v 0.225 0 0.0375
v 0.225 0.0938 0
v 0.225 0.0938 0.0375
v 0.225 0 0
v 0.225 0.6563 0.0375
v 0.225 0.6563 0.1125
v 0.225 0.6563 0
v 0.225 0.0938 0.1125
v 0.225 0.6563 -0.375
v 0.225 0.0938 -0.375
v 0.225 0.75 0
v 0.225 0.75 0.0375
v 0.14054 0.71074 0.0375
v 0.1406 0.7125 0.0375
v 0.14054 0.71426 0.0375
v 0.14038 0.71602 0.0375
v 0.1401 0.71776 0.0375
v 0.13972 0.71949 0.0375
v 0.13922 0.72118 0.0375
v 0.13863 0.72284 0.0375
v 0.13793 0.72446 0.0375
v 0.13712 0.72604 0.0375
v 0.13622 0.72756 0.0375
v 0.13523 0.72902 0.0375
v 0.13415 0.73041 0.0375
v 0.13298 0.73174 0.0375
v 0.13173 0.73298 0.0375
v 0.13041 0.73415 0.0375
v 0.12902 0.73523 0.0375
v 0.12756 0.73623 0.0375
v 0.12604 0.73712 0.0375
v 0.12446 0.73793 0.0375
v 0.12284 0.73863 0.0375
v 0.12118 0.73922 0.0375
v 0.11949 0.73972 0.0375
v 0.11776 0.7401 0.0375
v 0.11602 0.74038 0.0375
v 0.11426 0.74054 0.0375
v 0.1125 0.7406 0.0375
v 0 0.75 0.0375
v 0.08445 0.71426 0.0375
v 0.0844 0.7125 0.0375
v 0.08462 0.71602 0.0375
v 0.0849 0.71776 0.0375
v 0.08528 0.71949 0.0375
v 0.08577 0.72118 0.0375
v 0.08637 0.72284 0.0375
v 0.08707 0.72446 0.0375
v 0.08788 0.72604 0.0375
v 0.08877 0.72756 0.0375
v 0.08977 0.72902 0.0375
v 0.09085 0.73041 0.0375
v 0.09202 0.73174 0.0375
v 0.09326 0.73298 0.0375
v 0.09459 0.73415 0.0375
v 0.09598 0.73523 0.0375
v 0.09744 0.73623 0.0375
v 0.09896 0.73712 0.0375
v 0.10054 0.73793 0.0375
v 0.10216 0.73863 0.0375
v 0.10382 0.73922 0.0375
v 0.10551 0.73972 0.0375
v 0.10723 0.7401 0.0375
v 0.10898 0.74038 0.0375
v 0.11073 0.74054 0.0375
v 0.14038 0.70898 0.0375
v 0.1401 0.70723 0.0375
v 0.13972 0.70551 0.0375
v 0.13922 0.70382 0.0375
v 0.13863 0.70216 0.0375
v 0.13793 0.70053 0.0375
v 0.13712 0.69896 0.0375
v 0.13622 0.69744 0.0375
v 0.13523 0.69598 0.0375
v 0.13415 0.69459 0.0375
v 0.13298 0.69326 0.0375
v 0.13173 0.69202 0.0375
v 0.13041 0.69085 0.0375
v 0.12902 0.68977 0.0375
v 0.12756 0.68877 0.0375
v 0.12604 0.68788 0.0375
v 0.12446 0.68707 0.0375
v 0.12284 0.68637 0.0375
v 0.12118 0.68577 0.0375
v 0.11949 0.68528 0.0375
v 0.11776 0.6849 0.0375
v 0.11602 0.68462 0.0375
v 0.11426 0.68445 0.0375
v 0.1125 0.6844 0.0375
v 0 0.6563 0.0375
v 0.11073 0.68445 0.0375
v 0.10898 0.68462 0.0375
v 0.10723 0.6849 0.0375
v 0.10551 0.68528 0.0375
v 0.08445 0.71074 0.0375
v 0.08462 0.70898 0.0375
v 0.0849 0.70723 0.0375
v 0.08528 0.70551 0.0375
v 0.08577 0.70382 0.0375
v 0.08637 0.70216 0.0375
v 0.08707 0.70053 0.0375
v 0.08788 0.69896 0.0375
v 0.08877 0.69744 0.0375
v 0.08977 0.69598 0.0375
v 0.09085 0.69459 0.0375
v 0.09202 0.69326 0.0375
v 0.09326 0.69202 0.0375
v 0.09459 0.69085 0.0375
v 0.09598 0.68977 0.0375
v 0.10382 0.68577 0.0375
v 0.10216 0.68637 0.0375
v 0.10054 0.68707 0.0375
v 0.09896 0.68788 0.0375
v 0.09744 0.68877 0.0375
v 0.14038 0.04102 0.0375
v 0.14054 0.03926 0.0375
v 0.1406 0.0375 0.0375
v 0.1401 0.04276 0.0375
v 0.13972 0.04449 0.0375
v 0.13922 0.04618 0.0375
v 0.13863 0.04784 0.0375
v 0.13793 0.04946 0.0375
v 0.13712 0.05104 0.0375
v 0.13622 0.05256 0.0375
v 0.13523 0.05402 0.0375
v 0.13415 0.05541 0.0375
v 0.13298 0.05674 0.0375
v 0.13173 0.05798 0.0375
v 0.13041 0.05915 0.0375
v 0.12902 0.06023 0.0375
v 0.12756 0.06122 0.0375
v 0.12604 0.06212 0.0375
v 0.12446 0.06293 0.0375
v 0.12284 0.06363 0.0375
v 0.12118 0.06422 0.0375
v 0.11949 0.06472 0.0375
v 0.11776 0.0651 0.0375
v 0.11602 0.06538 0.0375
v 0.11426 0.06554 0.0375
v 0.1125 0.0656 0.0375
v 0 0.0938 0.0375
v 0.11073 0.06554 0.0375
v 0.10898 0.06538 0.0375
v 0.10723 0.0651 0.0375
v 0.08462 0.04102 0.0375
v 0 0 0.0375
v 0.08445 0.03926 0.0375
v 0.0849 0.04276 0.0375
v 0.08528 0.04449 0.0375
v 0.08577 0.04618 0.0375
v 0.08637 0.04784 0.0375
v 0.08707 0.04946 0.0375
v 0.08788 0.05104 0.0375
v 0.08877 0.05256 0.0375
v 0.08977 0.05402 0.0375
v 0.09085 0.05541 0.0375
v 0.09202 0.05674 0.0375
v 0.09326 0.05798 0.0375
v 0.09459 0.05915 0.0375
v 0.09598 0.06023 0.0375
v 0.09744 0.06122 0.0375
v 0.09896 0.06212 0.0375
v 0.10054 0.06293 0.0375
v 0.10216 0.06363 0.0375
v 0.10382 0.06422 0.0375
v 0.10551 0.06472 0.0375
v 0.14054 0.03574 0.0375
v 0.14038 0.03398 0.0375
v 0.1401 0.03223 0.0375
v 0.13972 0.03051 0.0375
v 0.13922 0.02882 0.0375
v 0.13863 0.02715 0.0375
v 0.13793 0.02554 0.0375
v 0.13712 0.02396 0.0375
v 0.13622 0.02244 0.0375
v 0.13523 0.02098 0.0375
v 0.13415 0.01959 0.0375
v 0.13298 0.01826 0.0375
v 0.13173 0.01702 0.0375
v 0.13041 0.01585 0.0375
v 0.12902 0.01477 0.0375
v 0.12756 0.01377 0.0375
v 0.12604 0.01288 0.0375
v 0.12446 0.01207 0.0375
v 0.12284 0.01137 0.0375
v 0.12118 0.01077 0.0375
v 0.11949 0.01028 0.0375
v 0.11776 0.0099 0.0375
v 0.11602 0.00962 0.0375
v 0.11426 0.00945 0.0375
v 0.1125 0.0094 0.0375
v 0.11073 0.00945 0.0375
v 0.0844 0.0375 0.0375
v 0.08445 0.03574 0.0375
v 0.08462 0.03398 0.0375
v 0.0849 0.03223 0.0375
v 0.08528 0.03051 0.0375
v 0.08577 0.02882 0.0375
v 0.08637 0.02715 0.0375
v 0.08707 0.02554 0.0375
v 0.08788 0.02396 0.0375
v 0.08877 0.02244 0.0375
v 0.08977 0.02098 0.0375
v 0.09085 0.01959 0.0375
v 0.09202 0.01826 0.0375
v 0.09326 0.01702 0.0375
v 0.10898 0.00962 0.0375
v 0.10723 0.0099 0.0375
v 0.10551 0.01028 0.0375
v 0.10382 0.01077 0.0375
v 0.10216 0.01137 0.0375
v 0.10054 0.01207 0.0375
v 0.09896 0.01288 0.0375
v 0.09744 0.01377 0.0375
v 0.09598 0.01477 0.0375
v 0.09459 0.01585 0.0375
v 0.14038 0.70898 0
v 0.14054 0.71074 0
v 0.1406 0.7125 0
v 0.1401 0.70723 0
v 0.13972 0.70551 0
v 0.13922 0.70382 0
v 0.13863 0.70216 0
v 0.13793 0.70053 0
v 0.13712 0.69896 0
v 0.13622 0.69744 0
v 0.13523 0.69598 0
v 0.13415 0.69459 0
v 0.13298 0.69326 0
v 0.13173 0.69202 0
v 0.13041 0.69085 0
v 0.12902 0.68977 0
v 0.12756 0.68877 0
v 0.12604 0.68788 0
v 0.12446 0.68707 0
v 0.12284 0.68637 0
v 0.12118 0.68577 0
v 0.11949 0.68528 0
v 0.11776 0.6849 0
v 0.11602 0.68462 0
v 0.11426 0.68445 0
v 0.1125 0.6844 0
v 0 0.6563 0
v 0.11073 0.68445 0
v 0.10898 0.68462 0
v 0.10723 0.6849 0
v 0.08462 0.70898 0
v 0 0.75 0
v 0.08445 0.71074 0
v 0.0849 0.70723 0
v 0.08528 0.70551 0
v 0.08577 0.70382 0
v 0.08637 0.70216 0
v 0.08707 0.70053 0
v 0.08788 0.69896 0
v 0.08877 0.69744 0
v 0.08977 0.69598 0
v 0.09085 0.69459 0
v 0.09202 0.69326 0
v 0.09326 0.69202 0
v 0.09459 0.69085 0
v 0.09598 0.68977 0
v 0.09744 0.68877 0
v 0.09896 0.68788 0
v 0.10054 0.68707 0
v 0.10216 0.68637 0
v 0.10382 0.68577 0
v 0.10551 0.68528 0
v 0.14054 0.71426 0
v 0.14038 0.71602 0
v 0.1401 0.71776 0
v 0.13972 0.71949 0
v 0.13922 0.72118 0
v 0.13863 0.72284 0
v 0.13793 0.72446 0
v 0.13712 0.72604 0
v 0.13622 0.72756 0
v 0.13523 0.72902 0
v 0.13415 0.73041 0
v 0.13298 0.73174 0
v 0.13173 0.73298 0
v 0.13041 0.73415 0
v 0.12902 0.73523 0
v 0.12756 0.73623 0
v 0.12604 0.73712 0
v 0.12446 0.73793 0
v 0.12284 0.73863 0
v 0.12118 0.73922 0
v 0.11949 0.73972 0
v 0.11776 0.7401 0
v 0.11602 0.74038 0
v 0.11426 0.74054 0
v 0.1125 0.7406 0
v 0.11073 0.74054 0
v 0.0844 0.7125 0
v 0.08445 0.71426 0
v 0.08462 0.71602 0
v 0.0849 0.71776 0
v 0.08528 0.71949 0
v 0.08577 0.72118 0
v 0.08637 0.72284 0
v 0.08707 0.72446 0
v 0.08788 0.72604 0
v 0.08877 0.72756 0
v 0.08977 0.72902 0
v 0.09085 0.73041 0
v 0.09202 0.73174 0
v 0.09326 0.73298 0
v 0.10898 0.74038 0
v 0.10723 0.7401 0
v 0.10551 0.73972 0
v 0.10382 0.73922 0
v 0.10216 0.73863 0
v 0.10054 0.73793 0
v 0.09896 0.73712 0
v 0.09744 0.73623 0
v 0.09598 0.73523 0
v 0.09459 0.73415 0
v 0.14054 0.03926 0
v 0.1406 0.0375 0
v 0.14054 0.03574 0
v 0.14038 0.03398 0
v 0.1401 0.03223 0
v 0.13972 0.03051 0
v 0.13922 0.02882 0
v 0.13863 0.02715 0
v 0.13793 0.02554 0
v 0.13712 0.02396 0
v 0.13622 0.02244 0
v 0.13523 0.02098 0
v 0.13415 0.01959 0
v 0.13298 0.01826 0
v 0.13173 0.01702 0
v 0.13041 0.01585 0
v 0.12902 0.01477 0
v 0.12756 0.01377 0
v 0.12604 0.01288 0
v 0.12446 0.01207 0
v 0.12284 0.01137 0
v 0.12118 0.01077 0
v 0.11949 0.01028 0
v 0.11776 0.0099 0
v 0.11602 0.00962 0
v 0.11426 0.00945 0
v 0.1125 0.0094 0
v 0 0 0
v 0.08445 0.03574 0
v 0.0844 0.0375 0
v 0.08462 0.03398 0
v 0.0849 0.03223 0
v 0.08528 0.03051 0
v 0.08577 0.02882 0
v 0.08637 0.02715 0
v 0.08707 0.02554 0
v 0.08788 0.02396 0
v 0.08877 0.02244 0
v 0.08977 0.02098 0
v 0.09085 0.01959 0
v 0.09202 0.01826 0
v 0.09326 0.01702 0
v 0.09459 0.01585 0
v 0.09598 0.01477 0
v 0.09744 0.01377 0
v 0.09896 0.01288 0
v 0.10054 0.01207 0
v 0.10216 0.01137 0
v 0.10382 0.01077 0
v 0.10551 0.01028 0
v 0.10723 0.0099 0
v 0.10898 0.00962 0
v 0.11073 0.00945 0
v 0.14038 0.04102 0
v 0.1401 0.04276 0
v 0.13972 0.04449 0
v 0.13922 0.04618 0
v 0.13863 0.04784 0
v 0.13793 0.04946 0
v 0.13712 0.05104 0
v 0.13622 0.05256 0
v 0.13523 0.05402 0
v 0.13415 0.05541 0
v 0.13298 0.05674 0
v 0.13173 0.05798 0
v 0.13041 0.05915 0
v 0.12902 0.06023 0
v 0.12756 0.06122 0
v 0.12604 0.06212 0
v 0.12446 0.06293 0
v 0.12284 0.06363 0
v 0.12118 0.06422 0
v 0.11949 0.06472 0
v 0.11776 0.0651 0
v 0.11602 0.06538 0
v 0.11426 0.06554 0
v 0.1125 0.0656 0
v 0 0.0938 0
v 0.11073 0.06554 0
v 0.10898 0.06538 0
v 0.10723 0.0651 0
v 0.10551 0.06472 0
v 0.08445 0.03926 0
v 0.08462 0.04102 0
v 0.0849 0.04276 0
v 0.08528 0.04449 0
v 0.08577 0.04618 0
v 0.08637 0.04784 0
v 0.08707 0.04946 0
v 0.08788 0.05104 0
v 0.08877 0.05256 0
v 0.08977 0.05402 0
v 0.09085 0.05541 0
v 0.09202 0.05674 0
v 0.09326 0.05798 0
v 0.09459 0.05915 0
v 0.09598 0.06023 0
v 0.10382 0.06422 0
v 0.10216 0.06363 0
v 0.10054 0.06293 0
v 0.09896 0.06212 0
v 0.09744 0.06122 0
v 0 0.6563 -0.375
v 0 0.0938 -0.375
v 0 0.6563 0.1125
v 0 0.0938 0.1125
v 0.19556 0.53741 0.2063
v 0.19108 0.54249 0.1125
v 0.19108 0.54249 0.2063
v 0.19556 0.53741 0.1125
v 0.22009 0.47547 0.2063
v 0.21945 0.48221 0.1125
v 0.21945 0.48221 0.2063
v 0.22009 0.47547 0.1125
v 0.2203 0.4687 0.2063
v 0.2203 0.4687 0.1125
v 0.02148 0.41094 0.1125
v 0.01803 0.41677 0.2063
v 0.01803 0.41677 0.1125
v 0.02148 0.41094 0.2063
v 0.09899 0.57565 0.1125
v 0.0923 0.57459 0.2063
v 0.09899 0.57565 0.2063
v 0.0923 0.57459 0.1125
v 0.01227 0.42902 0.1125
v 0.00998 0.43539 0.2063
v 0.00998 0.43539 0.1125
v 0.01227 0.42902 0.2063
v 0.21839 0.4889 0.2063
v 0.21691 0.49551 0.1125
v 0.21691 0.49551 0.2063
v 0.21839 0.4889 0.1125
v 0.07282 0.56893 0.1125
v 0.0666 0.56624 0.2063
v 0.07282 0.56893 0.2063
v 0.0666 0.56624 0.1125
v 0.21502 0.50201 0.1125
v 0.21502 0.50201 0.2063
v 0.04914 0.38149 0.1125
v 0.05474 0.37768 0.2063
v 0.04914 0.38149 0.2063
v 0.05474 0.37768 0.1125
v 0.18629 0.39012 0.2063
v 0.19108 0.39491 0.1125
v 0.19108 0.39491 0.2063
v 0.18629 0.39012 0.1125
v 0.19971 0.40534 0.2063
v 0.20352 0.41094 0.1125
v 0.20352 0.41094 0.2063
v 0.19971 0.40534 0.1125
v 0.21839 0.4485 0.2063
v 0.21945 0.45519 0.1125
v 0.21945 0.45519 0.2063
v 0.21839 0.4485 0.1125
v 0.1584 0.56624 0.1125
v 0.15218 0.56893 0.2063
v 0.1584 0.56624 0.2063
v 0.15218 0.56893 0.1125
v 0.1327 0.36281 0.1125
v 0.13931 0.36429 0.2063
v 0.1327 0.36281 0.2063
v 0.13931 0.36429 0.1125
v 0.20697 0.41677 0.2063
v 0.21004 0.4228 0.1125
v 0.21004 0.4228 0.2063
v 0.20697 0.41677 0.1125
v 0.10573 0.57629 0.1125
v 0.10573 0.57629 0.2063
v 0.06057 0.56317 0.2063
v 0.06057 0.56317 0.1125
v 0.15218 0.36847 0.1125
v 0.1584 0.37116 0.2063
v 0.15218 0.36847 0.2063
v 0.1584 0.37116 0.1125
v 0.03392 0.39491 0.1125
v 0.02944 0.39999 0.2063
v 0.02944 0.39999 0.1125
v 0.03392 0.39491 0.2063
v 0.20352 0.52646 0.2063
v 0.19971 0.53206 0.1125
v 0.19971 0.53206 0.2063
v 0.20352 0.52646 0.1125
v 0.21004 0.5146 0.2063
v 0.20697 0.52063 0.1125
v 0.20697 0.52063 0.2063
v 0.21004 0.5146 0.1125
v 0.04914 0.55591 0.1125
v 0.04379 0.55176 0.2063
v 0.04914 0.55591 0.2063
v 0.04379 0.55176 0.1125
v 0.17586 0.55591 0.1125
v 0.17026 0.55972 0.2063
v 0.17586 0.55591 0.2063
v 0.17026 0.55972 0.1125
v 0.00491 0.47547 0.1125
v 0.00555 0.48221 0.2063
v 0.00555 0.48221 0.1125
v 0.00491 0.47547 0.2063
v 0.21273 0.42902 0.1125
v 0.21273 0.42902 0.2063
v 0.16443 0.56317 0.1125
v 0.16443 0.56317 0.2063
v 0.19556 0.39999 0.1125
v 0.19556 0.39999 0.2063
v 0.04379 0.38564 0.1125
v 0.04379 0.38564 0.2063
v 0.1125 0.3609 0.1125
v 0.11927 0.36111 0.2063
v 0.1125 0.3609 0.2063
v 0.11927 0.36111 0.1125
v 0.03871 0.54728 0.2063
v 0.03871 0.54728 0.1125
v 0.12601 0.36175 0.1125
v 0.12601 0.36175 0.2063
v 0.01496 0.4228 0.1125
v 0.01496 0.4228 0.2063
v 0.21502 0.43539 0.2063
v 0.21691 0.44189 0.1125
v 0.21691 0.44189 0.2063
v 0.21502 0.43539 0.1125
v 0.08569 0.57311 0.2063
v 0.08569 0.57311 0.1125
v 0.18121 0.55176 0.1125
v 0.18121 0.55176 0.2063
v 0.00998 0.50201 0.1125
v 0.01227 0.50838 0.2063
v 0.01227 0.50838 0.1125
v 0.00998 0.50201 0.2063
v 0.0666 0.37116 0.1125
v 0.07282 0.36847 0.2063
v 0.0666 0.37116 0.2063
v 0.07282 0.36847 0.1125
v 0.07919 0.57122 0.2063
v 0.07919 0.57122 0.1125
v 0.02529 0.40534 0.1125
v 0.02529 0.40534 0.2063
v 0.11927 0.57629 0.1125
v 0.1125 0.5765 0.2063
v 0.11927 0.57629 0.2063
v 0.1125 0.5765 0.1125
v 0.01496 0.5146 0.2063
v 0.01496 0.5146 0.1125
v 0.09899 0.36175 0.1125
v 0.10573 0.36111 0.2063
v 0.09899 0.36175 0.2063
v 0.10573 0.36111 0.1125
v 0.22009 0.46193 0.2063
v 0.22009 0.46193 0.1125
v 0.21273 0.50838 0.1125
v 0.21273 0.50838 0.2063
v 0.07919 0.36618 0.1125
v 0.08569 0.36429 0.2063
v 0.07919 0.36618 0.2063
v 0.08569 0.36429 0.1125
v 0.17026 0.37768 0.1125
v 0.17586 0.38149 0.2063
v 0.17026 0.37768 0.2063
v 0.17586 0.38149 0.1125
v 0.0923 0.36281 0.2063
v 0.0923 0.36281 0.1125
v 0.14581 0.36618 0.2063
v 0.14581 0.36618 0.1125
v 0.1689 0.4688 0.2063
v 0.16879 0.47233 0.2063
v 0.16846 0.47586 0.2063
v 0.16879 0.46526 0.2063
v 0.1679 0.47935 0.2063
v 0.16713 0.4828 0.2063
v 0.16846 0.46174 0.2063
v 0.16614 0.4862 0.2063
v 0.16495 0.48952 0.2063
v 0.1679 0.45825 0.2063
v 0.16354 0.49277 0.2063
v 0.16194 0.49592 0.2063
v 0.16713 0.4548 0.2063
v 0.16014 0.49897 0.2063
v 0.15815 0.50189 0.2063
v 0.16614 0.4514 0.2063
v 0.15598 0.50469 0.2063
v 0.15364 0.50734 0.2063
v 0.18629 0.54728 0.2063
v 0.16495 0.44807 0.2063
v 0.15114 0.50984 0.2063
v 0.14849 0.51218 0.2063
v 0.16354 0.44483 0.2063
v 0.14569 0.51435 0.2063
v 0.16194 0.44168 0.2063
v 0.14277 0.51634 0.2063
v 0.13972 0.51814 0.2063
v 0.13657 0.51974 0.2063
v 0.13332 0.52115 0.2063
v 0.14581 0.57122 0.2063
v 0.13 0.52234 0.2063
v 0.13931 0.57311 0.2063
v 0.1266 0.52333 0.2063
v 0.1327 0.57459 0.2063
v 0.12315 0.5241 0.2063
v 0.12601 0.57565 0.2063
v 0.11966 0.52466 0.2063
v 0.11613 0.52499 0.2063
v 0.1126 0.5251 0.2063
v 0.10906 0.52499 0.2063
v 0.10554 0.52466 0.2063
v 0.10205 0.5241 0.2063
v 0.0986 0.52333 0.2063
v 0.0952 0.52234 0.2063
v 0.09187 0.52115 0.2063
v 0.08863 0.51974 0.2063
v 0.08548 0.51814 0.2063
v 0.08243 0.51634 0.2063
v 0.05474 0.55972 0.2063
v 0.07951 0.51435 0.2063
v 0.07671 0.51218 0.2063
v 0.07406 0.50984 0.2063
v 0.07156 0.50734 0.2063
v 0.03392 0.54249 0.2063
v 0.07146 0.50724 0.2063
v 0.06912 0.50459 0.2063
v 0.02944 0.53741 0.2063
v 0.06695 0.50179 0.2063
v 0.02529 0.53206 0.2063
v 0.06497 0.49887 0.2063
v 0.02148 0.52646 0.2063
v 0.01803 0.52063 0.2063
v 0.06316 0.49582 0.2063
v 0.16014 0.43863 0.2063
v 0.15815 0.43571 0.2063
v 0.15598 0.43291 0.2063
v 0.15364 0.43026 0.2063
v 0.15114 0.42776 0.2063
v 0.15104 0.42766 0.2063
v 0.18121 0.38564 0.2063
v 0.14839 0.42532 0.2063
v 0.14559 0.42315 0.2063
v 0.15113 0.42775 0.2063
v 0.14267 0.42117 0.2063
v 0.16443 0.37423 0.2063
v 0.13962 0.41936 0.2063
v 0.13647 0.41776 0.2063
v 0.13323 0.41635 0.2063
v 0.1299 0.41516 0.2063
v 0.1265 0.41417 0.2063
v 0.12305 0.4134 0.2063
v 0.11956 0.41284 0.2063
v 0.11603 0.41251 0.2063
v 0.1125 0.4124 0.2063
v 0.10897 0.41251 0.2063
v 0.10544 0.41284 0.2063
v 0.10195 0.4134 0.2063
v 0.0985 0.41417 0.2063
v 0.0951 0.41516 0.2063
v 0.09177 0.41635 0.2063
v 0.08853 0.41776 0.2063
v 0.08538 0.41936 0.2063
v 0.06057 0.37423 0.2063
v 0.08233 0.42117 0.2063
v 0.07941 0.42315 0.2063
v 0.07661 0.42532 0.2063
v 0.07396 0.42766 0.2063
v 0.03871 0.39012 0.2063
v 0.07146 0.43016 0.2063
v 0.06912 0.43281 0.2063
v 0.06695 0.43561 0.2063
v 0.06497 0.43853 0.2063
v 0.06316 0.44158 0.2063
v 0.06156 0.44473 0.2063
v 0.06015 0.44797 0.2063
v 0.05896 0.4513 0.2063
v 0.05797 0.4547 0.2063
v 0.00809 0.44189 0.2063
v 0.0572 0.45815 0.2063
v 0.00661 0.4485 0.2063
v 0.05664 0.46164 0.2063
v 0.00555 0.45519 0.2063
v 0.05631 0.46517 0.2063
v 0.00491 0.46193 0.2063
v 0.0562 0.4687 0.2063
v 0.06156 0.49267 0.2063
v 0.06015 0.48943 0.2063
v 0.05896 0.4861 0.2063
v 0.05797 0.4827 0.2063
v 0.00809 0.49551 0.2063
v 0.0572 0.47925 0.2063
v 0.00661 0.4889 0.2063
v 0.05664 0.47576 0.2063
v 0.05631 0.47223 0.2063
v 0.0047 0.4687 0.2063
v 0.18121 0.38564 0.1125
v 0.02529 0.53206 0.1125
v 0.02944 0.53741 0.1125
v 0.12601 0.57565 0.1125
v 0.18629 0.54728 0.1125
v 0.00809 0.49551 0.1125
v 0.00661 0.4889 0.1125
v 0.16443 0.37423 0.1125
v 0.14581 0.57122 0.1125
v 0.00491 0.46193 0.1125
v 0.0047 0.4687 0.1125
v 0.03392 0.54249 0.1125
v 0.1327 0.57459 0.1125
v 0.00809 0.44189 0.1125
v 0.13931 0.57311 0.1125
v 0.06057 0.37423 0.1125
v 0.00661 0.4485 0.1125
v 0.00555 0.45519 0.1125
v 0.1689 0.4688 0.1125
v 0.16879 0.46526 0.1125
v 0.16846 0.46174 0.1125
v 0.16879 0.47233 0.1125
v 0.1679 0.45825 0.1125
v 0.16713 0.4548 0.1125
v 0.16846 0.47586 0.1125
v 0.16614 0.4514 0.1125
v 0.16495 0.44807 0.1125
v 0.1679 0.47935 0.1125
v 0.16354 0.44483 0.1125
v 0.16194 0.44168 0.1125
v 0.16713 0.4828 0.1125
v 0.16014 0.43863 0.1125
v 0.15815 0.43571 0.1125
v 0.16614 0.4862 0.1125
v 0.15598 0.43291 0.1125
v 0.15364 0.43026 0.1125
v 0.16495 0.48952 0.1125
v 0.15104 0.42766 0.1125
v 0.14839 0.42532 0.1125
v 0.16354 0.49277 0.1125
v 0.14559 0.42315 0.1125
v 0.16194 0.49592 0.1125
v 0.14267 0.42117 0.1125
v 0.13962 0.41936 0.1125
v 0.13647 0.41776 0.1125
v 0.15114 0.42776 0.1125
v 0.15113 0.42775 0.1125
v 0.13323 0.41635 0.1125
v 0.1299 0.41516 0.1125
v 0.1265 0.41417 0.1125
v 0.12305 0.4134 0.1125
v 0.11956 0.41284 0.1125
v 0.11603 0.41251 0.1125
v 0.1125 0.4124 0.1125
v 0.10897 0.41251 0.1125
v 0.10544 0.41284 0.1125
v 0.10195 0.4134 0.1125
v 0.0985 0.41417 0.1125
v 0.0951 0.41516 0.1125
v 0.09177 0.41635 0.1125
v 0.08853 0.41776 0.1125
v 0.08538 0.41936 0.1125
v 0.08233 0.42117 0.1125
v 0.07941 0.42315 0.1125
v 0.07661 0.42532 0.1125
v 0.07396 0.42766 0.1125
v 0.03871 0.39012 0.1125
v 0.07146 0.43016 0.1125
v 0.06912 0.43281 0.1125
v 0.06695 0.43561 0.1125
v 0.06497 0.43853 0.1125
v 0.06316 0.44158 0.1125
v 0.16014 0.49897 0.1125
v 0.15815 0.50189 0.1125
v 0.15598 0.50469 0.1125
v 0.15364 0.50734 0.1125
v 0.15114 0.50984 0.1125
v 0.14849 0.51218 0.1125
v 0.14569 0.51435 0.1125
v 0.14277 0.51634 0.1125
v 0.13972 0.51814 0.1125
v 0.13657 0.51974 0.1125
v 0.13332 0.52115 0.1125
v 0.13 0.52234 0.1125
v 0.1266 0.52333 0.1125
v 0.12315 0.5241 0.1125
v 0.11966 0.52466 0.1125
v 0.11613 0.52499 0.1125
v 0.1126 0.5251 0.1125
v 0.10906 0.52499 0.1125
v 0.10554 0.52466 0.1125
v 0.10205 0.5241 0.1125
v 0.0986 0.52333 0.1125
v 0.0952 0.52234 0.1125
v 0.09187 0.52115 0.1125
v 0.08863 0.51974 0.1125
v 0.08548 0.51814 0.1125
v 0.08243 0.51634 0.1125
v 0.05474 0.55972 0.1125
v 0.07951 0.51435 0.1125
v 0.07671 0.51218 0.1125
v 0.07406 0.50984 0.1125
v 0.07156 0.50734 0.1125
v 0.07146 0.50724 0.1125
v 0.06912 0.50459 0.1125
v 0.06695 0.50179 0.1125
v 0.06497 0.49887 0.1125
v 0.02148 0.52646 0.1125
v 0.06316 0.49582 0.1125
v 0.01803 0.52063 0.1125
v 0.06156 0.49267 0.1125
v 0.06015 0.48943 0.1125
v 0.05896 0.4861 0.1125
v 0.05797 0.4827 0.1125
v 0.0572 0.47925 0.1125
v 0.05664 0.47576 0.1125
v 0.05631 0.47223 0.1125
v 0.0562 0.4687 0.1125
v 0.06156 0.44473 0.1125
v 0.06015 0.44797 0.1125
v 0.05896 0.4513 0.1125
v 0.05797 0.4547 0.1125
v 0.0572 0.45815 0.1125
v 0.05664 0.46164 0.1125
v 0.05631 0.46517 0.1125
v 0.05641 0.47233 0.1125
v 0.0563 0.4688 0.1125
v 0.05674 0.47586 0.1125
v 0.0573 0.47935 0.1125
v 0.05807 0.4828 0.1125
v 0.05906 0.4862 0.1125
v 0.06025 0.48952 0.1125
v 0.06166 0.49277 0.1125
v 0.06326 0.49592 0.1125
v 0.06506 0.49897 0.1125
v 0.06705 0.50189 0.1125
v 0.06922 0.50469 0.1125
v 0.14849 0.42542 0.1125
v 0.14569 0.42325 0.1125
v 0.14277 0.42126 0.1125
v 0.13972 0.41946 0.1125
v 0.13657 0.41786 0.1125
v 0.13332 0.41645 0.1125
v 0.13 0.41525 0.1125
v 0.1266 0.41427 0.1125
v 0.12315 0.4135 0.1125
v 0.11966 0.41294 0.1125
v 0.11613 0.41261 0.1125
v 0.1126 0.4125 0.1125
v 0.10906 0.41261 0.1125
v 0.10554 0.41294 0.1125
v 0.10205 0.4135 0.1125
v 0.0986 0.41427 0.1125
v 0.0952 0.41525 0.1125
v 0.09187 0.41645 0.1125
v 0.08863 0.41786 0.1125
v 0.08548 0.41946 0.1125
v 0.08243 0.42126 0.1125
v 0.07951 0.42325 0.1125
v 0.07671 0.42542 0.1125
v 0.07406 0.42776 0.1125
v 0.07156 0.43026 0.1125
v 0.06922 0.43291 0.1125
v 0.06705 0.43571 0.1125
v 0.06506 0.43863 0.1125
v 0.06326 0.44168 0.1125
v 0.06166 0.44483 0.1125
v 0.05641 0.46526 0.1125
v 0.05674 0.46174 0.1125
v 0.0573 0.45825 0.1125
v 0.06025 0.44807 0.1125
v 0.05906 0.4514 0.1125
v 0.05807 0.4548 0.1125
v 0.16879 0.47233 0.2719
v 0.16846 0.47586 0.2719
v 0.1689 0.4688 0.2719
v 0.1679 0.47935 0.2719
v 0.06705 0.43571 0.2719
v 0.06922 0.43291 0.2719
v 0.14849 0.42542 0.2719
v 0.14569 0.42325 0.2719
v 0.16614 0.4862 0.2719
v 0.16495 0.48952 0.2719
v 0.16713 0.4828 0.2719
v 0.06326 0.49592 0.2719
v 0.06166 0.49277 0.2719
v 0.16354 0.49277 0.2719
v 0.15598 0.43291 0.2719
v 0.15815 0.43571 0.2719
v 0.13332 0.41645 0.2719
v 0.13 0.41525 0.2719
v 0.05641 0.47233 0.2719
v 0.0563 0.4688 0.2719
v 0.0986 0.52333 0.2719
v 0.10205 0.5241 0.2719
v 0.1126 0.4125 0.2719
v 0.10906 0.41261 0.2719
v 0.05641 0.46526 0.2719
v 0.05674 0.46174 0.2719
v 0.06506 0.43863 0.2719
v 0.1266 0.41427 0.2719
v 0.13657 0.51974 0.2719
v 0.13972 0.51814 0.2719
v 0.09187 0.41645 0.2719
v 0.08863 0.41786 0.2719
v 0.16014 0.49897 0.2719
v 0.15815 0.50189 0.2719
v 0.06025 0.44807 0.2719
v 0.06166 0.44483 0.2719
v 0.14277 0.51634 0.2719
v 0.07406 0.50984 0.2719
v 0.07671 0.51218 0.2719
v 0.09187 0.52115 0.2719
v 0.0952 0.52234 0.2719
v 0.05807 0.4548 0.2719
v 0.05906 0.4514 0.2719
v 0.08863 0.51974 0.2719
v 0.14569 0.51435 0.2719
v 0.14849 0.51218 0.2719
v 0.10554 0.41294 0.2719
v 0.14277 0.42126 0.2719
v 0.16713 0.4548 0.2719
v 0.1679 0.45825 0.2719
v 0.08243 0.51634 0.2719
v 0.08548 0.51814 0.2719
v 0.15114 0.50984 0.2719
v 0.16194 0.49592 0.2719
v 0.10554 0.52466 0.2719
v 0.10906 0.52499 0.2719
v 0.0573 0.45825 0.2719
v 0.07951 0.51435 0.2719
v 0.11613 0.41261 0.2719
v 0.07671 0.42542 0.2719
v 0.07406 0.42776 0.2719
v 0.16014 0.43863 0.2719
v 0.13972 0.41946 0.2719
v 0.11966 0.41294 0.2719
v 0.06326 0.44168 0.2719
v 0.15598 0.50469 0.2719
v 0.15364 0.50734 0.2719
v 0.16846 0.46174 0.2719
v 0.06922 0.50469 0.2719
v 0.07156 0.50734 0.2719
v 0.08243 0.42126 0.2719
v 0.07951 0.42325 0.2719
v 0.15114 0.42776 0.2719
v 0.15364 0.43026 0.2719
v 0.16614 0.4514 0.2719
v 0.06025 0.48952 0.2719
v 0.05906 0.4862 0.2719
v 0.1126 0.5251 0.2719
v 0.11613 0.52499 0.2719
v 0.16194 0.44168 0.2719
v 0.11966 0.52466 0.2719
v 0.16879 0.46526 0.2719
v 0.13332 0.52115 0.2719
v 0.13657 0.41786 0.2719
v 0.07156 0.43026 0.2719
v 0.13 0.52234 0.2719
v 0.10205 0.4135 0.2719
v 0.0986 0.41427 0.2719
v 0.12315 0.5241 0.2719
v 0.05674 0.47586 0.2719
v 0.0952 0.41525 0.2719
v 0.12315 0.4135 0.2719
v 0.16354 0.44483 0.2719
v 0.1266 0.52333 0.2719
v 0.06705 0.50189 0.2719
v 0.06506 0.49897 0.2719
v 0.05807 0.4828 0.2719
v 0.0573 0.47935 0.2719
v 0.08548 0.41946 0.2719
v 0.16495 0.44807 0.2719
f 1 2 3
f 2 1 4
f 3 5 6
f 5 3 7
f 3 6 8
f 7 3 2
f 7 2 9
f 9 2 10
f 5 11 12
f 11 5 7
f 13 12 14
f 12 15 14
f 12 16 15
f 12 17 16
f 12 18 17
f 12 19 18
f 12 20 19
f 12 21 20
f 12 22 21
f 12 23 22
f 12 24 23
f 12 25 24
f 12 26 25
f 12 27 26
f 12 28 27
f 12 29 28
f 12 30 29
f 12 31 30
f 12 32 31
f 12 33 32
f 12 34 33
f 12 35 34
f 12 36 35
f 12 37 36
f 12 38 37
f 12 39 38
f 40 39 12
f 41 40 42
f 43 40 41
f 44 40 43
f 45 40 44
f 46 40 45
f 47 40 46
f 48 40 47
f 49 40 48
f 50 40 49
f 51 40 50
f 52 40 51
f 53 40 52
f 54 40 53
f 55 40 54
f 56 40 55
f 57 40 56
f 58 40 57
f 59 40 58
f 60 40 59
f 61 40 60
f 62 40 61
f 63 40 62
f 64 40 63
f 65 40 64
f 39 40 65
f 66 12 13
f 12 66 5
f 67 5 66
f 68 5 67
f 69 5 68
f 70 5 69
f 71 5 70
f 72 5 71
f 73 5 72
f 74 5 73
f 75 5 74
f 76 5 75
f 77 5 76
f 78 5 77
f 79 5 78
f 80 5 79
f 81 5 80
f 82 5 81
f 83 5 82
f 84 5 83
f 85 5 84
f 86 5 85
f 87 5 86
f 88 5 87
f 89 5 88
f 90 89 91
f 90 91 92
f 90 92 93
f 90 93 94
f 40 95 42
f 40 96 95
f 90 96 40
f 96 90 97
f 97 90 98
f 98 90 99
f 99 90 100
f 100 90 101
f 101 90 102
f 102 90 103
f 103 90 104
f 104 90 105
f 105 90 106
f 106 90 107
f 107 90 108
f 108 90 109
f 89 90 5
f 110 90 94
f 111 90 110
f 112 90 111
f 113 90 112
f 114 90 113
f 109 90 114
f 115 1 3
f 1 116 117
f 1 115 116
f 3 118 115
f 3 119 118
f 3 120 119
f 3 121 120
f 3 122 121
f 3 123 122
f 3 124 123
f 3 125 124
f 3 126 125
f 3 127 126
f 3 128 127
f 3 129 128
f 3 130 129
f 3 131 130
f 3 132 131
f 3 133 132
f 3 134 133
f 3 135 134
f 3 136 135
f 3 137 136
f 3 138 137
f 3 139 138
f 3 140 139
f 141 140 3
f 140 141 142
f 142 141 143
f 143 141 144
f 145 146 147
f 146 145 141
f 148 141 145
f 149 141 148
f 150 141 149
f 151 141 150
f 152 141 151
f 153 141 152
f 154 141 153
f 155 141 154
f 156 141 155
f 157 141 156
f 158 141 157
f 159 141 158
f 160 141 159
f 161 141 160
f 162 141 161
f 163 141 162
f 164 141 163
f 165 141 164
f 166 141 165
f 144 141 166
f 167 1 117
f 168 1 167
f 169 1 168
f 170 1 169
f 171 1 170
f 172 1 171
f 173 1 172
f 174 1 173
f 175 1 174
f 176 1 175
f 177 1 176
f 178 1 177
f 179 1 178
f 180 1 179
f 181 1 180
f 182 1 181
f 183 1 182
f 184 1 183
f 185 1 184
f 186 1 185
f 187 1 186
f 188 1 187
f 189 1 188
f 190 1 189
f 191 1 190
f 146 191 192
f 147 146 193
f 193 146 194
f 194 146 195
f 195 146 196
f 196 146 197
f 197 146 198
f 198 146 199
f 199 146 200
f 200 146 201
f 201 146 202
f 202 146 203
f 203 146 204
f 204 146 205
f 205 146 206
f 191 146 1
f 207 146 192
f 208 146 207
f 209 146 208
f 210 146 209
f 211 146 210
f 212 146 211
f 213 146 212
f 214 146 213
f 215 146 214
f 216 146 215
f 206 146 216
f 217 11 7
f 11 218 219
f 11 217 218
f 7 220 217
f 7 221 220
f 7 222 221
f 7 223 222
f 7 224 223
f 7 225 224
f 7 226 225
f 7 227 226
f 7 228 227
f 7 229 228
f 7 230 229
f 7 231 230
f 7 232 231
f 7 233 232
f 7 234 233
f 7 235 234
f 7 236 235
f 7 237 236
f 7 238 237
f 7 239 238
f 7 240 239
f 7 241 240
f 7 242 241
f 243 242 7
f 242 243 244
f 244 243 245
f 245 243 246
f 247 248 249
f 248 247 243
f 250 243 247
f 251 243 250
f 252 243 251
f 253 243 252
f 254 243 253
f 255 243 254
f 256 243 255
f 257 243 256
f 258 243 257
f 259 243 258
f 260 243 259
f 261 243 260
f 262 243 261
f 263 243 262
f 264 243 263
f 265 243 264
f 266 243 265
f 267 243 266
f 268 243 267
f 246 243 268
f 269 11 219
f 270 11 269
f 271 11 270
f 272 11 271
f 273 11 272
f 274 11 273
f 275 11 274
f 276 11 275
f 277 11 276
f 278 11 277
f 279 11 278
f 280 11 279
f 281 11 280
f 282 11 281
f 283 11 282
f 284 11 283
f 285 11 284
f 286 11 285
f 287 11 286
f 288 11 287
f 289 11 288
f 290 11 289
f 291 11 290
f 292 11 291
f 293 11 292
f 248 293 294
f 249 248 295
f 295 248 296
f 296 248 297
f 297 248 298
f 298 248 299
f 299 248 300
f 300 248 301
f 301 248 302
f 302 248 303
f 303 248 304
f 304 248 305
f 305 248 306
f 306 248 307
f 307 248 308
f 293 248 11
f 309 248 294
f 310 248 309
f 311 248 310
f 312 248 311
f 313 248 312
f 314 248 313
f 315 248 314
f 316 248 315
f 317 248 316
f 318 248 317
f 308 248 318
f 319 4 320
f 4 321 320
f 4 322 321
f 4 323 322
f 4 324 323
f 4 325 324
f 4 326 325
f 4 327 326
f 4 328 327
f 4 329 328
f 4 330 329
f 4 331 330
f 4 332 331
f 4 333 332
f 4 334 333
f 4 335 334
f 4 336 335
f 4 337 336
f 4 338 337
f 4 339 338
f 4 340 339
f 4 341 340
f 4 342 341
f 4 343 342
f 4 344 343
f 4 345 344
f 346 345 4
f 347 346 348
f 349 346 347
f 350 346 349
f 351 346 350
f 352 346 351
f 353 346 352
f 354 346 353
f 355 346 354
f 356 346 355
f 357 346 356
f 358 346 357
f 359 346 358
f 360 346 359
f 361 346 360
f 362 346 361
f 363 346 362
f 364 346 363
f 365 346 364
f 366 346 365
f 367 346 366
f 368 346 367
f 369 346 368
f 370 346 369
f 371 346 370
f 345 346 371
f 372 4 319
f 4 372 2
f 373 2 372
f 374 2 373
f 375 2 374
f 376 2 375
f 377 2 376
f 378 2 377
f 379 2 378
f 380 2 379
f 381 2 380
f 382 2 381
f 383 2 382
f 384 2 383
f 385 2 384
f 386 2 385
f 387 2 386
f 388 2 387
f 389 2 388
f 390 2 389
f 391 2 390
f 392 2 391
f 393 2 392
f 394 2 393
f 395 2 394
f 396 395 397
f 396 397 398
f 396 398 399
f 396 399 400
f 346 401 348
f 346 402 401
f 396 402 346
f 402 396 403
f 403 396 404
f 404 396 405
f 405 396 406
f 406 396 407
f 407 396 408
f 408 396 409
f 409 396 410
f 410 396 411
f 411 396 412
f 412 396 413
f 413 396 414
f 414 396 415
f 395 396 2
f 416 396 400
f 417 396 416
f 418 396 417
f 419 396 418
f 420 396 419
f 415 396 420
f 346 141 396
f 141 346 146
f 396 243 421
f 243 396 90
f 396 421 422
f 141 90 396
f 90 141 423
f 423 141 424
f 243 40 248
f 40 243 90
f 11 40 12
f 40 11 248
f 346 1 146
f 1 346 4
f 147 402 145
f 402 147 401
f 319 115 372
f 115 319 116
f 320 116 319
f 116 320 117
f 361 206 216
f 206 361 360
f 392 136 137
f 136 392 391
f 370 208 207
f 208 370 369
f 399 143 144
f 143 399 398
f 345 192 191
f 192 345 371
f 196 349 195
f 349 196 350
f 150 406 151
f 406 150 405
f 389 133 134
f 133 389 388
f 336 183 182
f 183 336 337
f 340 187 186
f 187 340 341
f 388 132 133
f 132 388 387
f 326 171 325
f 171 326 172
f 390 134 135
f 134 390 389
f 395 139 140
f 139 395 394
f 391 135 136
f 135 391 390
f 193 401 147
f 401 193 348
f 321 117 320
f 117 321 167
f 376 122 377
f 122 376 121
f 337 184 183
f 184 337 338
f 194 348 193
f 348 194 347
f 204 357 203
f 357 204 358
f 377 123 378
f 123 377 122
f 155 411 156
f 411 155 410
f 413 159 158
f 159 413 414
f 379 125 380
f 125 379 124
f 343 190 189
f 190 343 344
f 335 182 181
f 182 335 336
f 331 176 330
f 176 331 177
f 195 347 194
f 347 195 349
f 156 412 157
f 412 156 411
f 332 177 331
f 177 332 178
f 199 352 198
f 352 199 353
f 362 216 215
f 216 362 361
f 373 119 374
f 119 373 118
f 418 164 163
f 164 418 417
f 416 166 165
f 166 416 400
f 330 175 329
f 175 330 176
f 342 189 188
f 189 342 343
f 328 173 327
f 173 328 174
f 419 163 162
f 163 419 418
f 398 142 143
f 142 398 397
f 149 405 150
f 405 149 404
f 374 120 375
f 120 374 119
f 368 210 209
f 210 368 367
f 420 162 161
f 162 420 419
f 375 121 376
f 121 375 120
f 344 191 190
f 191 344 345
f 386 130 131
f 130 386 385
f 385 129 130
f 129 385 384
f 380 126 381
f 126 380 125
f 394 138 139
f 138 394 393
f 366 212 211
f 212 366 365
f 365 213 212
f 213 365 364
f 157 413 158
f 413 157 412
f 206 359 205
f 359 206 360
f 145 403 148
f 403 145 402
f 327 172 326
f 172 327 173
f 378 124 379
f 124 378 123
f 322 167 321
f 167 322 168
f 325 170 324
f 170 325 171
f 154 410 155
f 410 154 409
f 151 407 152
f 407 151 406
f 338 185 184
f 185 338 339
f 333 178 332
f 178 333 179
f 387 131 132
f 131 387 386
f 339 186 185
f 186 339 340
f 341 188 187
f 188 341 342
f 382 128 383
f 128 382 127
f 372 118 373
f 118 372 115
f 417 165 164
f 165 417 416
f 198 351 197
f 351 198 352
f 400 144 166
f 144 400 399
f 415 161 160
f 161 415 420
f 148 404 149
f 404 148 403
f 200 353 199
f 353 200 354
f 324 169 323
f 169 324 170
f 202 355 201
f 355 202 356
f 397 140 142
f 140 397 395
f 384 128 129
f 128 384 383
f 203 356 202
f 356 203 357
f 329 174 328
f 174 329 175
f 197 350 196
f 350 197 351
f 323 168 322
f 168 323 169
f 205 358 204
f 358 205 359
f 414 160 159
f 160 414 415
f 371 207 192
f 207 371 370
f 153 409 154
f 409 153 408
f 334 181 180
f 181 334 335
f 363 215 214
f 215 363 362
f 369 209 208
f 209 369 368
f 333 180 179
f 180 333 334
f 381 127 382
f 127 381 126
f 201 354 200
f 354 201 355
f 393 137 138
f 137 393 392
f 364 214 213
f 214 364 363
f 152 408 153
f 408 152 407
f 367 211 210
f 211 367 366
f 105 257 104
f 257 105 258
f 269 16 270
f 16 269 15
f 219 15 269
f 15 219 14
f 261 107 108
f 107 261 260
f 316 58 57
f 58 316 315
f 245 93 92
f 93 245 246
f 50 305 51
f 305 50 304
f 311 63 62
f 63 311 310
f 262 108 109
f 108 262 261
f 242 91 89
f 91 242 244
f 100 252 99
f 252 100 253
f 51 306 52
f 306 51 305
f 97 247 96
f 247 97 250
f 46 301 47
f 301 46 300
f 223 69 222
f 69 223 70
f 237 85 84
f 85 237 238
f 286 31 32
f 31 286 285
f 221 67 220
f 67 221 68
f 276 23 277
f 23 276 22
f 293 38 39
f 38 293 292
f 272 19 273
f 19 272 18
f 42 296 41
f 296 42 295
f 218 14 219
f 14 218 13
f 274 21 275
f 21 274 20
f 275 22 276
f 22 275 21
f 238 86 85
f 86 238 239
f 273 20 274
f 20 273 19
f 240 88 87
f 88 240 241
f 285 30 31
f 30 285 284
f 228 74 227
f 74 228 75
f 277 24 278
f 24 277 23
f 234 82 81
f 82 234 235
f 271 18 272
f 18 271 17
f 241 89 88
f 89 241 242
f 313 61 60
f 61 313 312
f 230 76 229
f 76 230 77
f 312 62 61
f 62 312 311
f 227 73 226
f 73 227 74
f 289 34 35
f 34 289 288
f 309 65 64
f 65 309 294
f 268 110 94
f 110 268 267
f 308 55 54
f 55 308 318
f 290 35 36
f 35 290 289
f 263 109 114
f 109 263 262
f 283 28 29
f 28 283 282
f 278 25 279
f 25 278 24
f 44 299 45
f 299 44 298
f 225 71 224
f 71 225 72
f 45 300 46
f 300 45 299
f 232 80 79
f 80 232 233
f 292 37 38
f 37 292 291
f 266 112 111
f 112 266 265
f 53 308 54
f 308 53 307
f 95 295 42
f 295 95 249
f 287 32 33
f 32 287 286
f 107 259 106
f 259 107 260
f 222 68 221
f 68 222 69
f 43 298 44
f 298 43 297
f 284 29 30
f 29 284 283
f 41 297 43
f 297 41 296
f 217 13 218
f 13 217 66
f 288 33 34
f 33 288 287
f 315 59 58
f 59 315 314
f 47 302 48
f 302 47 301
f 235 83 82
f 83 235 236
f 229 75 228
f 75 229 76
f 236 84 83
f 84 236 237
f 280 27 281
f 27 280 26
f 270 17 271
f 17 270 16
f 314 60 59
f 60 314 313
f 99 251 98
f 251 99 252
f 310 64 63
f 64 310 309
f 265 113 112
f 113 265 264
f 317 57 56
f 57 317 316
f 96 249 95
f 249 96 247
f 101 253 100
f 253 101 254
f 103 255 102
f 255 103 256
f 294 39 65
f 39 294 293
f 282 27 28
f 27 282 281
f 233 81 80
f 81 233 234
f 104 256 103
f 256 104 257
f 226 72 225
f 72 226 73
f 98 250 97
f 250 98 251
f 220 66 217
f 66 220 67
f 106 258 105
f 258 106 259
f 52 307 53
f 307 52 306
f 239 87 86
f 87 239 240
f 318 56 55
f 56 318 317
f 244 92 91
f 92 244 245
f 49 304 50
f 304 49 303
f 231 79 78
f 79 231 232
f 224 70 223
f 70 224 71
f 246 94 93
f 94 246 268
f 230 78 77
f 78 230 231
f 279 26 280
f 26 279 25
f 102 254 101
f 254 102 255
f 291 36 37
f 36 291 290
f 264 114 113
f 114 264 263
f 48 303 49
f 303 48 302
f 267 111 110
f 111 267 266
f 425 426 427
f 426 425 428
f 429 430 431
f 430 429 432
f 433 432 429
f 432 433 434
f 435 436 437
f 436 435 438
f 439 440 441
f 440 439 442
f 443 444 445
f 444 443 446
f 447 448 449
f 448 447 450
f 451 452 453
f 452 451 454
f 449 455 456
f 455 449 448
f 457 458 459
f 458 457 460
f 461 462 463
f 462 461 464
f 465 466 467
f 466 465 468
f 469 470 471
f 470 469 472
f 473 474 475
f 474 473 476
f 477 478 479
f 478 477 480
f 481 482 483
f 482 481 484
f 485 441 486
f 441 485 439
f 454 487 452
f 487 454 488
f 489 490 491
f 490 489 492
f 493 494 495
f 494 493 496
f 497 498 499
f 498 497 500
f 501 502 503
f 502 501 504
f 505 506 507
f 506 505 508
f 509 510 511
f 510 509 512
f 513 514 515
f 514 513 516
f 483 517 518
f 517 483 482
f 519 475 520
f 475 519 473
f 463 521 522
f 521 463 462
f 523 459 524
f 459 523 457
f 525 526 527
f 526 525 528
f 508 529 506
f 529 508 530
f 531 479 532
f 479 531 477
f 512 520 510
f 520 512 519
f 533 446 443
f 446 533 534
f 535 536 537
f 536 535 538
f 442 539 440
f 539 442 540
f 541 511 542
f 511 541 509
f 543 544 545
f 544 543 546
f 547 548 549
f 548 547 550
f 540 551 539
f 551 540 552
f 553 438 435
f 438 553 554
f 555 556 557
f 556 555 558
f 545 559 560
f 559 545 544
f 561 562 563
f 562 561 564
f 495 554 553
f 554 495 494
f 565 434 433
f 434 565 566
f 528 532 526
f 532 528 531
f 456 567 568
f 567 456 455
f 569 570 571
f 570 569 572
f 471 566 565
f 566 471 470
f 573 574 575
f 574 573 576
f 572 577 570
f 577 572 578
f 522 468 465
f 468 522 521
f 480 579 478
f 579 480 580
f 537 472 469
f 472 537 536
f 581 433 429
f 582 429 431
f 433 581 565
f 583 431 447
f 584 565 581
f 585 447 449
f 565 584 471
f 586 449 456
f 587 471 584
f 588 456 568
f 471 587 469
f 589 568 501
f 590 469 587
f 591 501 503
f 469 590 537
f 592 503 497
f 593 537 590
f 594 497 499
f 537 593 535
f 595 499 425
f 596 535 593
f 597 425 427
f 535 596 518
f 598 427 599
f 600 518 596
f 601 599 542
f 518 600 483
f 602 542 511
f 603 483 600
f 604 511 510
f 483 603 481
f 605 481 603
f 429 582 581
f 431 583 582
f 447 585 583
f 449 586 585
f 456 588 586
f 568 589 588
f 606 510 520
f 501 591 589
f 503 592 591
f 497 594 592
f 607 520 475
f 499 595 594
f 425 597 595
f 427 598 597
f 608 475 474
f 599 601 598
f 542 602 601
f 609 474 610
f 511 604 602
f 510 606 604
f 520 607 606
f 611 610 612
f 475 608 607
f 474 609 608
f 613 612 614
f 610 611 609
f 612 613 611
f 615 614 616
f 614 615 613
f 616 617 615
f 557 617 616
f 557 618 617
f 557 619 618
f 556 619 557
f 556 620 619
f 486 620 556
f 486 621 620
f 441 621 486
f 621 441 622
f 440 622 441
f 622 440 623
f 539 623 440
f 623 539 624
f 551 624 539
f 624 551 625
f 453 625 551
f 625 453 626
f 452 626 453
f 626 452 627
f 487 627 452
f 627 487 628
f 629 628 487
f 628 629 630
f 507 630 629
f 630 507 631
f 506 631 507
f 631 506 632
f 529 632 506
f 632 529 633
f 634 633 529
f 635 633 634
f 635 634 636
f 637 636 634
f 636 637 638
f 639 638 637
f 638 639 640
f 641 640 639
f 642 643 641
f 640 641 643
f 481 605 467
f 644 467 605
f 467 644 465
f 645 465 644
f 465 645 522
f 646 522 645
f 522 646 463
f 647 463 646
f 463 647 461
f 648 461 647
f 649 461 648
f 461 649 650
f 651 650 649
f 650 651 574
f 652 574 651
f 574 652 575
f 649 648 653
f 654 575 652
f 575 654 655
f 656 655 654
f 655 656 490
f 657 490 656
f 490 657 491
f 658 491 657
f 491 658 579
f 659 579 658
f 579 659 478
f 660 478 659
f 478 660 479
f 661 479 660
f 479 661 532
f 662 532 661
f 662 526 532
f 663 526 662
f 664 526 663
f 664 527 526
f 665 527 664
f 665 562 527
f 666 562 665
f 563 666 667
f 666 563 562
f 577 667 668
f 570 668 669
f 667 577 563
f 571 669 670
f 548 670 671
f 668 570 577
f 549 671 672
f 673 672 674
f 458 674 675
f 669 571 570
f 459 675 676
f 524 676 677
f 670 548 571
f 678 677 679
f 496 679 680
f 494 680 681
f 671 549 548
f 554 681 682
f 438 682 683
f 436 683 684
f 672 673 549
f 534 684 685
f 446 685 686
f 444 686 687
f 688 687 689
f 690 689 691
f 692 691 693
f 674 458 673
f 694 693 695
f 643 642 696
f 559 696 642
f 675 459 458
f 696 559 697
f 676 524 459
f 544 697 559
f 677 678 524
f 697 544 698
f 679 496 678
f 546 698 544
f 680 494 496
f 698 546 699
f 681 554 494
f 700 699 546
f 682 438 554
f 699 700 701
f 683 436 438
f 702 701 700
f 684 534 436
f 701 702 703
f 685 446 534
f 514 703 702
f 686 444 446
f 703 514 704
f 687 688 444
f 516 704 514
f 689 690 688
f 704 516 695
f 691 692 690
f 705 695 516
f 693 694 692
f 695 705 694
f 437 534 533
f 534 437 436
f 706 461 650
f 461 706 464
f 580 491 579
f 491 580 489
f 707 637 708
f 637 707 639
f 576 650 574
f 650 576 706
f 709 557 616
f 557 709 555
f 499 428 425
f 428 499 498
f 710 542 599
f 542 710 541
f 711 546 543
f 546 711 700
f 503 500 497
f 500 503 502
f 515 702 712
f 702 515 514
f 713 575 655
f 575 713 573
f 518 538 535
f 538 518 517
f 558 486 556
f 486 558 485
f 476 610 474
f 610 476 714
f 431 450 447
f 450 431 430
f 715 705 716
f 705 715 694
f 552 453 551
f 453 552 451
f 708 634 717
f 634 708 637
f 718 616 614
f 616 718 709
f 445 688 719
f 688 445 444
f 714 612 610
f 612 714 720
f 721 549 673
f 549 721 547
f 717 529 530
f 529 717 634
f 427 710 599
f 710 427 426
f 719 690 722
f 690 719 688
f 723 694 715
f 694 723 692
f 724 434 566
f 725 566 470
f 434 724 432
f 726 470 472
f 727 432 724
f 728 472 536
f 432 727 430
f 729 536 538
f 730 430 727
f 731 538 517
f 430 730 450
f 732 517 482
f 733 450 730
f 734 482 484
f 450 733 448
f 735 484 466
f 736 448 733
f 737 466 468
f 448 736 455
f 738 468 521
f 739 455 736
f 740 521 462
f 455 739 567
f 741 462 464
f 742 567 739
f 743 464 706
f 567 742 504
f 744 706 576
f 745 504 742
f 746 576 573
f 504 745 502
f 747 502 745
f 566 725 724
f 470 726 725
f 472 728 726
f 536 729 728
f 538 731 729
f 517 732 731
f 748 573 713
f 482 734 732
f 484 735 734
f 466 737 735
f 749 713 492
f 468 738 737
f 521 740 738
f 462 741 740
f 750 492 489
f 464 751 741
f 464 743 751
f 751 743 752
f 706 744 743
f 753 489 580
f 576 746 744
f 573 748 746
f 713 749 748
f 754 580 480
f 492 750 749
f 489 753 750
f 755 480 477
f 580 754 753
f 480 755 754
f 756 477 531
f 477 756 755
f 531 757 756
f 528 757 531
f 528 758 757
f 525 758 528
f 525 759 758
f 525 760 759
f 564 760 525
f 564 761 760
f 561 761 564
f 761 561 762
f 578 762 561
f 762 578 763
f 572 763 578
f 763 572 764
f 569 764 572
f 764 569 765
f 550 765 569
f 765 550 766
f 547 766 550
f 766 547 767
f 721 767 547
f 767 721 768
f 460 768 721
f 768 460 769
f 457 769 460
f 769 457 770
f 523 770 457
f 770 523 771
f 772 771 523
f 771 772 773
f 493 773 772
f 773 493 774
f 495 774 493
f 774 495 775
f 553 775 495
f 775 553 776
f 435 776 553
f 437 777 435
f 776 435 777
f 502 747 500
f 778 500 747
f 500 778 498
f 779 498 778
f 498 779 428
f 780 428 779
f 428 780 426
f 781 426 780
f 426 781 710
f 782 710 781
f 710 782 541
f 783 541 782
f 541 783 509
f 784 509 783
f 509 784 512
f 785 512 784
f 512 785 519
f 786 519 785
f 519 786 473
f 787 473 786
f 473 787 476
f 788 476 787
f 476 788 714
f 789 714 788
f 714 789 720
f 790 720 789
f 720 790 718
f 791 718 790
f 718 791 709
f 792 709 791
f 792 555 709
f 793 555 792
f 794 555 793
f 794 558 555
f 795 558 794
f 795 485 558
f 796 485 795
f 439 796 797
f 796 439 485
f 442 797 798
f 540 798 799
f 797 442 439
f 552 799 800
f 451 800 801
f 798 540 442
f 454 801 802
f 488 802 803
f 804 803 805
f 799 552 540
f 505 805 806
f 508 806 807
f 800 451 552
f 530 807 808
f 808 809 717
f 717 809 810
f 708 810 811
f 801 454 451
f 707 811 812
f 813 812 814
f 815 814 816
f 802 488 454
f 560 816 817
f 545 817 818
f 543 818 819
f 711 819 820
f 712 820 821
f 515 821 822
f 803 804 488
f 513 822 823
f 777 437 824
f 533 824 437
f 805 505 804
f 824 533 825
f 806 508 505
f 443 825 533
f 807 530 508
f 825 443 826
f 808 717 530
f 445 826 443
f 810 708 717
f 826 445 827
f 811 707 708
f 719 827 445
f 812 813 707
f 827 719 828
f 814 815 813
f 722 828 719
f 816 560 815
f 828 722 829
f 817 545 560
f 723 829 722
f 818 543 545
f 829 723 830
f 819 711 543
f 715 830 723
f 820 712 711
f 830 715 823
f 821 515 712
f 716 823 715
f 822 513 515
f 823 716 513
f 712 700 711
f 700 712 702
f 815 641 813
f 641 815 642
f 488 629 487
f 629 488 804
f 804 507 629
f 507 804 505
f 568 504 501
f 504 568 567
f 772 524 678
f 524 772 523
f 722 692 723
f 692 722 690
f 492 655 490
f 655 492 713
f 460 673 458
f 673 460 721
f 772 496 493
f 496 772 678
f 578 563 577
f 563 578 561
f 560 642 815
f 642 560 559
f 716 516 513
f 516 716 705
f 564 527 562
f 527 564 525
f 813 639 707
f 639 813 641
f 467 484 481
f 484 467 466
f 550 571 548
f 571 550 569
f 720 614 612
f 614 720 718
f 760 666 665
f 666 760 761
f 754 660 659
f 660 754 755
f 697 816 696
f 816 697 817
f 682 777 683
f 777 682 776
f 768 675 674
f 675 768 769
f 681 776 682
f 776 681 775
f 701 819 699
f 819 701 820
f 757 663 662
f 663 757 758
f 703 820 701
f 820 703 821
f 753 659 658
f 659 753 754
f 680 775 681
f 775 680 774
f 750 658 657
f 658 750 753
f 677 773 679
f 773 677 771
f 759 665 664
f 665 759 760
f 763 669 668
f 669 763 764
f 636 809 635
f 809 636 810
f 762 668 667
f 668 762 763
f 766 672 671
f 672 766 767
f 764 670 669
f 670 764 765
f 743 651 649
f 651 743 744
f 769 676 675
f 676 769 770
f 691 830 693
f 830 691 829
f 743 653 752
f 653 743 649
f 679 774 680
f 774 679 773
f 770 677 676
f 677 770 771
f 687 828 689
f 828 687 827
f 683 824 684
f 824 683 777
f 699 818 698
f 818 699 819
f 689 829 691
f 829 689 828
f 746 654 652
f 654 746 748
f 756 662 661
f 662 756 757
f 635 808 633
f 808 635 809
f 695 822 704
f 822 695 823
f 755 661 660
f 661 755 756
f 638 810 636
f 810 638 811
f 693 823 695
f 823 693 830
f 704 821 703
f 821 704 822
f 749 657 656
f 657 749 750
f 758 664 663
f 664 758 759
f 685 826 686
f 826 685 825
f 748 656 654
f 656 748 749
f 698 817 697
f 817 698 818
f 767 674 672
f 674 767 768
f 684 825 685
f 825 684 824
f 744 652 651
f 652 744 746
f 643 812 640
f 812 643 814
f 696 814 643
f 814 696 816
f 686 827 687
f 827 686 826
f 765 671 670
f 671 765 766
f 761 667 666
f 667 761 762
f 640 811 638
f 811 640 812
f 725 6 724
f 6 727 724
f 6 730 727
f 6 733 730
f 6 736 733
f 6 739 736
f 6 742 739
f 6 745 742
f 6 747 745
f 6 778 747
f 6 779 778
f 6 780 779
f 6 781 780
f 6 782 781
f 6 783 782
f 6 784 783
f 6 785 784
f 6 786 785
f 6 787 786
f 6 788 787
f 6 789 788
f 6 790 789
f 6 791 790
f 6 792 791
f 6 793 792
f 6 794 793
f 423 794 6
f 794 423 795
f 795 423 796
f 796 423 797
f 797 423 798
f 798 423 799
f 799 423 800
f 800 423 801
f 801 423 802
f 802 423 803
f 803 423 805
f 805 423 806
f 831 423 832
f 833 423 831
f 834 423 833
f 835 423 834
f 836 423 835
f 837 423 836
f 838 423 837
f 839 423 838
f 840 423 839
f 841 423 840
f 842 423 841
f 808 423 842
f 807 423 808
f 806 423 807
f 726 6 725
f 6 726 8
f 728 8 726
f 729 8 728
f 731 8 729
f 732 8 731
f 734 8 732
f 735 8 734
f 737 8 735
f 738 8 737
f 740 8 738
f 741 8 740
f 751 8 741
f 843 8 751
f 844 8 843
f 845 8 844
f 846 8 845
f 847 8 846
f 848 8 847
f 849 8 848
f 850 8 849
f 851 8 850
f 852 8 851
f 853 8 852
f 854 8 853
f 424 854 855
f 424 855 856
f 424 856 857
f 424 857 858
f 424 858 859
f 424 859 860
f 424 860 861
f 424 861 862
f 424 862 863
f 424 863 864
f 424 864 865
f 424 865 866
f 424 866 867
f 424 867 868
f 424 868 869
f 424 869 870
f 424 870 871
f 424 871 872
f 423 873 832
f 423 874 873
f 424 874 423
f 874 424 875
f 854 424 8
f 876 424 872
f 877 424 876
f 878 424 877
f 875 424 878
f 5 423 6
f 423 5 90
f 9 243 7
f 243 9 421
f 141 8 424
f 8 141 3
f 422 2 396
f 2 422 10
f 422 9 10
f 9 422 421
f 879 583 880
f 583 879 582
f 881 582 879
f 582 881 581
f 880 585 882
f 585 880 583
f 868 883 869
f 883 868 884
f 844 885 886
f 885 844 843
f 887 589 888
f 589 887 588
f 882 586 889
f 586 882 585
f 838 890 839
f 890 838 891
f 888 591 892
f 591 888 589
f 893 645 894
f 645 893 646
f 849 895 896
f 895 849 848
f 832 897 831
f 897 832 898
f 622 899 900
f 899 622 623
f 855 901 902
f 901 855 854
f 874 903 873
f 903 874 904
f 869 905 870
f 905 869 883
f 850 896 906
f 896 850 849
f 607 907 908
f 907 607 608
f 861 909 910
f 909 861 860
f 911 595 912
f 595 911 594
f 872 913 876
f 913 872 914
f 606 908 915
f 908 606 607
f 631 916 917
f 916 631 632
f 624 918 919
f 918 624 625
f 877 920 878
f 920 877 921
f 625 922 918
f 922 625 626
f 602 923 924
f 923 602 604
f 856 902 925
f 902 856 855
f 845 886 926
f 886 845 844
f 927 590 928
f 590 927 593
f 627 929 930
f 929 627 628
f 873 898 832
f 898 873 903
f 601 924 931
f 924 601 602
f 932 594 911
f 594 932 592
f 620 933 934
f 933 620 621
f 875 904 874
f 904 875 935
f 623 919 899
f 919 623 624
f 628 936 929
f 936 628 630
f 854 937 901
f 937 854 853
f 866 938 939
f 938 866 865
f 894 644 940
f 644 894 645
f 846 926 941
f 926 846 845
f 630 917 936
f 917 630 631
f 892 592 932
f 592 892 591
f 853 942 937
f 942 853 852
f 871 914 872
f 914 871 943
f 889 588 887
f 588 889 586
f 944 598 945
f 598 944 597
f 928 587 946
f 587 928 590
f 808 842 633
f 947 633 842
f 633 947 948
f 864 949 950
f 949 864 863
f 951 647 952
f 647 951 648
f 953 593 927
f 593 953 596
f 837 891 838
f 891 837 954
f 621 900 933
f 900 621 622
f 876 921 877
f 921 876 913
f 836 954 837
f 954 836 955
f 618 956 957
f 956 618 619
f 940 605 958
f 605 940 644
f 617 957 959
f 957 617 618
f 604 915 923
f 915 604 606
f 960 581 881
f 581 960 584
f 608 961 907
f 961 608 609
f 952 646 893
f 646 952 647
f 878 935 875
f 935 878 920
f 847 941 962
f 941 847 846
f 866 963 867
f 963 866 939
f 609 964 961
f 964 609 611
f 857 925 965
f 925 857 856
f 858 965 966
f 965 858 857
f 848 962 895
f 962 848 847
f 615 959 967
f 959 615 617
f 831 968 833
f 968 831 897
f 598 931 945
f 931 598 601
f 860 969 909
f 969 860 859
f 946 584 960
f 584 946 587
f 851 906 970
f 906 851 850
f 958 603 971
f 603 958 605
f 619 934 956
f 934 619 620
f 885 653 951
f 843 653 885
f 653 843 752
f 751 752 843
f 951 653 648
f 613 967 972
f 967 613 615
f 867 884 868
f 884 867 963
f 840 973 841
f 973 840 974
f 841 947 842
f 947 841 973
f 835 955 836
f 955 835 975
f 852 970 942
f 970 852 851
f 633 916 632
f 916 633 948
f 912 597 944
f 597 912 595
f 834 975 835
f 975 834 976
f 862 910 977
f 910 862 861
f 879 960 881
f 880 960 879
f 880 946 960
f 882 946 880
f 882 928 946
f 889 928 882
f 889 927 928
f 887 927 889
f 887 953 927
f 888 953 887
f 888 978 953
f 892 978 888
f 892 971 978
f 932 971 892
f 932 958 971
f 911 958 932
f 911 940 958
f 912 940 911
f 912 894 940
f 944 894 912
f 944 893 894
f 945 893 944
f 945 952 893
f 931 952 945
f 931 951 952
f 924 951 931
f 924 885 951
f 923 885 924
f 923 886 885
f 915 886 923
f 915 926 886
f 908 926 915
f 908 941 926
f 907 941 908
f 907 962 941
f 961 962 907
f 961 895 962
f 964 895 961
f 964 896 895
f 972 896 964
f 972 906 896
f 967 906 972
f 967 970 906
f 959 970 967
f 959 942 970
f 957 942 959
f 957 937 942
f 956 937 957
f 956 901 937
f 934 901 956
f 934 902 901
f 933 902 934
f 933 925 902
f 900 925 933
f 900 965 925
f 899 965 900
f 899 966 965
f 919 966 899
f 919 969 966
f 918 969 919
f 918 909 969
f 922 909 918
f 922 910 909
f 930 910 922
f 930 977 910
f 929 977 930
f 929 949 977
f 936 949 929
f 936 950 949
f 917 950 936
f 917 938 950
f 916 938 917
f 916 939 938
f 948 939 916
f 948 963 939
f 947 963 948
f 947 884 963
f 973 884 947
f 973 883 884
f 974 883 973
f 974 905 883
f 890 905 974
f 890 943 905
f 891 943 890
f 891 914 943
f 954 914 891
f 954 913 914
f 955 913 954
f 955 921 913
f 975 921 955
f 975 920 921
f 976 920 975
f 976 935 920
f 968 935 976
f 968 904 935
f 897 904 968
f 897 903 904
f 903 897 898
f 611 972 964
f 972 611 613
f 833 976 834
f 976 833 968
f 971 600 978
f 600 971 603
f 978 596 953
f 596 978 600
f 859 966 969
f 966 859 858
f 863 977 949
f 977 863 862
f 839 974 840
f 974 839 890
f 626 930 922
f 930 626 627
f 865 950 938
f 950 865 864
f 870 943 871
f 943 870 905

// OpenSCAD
// Resolution for curved surfaces
$fn = 100;

// --- Parameters ---

// Base plate dimensions
plate_length = 0.225;
plate_width = 0.75;
plate_thickness = 0.0375;

// Through hole dimensions and positions
hole_radius = 0.0281;
hole_left_offset = 0.1125;
hole_front_offset_1 = 0.0375;
hole_front_offset_2 = 0.7125;

// Central rectangular solid dimensions
rect_length = 0.225;
rect_width = 0.5625;
rect_front_offset = 0.0938;
rect_upper_height = 0.1125;
rect_lower_depth = 0.375;

// Annular collar (stepped boss) dimensions
boss_radius_outer = 0.1078;
boss_radius_inner = 0.0563;
boss_height = 0.0938;
boss_x_offset = 0.1125;
boss_y_offset = 0.4687;

// Solid circular pin dimensions
pin_radius = 0.0563;
pin_height = 0.1594;
pin_x_offset = 0.1126;
pin_y_offset = 0.4688;

// --- Geometry ---

union() {
    // Main base plate with separate through holes near ends
    difference() {
        cube([plate_length, plate_width, plate_thickness]);

        // Front through hole
        translate([hole_left_offset, hole_front_offset_1, -0.01])
            cylinder(h = plate_thickness + 0.02, r = hole_radius);

        // Back through hole
        translate([hole_left_offset, hole_front_offset_2, -0.01])
            cylinder(h = plate_thickness + 0.02, r = hole_radius);
    }

    // Central upper rectangular solid
    translate([0, rect_front_offset, 0])
        cube([rect_length, rect_width, rect_upper_height]);

    // Central underside rectangular solid
    translate([0, rect_front_offset, -rect_lower_depth])
        cube([rect_length, rect_width, rect_lower_depth]);

    // Round stepped boss (hollow annular collar)
    translate([boss_x_offset, boss_y_offset, rect_upper_height])
        difference() {
            cylinder(h = boss_height, r = boss_radius_outer);
            // Inner cutout to make it an annular ring
            translate([0, 0, -0.01])
                cylinder(h = boss_height + 0.02, r = boss_radius_inner);
        }

    // Upper solid circular pin
    translate([pin_x_offset, pin_y_offset, rect_upper_height])
        cylinder(h = pin_height, r = pin_radius);
}
